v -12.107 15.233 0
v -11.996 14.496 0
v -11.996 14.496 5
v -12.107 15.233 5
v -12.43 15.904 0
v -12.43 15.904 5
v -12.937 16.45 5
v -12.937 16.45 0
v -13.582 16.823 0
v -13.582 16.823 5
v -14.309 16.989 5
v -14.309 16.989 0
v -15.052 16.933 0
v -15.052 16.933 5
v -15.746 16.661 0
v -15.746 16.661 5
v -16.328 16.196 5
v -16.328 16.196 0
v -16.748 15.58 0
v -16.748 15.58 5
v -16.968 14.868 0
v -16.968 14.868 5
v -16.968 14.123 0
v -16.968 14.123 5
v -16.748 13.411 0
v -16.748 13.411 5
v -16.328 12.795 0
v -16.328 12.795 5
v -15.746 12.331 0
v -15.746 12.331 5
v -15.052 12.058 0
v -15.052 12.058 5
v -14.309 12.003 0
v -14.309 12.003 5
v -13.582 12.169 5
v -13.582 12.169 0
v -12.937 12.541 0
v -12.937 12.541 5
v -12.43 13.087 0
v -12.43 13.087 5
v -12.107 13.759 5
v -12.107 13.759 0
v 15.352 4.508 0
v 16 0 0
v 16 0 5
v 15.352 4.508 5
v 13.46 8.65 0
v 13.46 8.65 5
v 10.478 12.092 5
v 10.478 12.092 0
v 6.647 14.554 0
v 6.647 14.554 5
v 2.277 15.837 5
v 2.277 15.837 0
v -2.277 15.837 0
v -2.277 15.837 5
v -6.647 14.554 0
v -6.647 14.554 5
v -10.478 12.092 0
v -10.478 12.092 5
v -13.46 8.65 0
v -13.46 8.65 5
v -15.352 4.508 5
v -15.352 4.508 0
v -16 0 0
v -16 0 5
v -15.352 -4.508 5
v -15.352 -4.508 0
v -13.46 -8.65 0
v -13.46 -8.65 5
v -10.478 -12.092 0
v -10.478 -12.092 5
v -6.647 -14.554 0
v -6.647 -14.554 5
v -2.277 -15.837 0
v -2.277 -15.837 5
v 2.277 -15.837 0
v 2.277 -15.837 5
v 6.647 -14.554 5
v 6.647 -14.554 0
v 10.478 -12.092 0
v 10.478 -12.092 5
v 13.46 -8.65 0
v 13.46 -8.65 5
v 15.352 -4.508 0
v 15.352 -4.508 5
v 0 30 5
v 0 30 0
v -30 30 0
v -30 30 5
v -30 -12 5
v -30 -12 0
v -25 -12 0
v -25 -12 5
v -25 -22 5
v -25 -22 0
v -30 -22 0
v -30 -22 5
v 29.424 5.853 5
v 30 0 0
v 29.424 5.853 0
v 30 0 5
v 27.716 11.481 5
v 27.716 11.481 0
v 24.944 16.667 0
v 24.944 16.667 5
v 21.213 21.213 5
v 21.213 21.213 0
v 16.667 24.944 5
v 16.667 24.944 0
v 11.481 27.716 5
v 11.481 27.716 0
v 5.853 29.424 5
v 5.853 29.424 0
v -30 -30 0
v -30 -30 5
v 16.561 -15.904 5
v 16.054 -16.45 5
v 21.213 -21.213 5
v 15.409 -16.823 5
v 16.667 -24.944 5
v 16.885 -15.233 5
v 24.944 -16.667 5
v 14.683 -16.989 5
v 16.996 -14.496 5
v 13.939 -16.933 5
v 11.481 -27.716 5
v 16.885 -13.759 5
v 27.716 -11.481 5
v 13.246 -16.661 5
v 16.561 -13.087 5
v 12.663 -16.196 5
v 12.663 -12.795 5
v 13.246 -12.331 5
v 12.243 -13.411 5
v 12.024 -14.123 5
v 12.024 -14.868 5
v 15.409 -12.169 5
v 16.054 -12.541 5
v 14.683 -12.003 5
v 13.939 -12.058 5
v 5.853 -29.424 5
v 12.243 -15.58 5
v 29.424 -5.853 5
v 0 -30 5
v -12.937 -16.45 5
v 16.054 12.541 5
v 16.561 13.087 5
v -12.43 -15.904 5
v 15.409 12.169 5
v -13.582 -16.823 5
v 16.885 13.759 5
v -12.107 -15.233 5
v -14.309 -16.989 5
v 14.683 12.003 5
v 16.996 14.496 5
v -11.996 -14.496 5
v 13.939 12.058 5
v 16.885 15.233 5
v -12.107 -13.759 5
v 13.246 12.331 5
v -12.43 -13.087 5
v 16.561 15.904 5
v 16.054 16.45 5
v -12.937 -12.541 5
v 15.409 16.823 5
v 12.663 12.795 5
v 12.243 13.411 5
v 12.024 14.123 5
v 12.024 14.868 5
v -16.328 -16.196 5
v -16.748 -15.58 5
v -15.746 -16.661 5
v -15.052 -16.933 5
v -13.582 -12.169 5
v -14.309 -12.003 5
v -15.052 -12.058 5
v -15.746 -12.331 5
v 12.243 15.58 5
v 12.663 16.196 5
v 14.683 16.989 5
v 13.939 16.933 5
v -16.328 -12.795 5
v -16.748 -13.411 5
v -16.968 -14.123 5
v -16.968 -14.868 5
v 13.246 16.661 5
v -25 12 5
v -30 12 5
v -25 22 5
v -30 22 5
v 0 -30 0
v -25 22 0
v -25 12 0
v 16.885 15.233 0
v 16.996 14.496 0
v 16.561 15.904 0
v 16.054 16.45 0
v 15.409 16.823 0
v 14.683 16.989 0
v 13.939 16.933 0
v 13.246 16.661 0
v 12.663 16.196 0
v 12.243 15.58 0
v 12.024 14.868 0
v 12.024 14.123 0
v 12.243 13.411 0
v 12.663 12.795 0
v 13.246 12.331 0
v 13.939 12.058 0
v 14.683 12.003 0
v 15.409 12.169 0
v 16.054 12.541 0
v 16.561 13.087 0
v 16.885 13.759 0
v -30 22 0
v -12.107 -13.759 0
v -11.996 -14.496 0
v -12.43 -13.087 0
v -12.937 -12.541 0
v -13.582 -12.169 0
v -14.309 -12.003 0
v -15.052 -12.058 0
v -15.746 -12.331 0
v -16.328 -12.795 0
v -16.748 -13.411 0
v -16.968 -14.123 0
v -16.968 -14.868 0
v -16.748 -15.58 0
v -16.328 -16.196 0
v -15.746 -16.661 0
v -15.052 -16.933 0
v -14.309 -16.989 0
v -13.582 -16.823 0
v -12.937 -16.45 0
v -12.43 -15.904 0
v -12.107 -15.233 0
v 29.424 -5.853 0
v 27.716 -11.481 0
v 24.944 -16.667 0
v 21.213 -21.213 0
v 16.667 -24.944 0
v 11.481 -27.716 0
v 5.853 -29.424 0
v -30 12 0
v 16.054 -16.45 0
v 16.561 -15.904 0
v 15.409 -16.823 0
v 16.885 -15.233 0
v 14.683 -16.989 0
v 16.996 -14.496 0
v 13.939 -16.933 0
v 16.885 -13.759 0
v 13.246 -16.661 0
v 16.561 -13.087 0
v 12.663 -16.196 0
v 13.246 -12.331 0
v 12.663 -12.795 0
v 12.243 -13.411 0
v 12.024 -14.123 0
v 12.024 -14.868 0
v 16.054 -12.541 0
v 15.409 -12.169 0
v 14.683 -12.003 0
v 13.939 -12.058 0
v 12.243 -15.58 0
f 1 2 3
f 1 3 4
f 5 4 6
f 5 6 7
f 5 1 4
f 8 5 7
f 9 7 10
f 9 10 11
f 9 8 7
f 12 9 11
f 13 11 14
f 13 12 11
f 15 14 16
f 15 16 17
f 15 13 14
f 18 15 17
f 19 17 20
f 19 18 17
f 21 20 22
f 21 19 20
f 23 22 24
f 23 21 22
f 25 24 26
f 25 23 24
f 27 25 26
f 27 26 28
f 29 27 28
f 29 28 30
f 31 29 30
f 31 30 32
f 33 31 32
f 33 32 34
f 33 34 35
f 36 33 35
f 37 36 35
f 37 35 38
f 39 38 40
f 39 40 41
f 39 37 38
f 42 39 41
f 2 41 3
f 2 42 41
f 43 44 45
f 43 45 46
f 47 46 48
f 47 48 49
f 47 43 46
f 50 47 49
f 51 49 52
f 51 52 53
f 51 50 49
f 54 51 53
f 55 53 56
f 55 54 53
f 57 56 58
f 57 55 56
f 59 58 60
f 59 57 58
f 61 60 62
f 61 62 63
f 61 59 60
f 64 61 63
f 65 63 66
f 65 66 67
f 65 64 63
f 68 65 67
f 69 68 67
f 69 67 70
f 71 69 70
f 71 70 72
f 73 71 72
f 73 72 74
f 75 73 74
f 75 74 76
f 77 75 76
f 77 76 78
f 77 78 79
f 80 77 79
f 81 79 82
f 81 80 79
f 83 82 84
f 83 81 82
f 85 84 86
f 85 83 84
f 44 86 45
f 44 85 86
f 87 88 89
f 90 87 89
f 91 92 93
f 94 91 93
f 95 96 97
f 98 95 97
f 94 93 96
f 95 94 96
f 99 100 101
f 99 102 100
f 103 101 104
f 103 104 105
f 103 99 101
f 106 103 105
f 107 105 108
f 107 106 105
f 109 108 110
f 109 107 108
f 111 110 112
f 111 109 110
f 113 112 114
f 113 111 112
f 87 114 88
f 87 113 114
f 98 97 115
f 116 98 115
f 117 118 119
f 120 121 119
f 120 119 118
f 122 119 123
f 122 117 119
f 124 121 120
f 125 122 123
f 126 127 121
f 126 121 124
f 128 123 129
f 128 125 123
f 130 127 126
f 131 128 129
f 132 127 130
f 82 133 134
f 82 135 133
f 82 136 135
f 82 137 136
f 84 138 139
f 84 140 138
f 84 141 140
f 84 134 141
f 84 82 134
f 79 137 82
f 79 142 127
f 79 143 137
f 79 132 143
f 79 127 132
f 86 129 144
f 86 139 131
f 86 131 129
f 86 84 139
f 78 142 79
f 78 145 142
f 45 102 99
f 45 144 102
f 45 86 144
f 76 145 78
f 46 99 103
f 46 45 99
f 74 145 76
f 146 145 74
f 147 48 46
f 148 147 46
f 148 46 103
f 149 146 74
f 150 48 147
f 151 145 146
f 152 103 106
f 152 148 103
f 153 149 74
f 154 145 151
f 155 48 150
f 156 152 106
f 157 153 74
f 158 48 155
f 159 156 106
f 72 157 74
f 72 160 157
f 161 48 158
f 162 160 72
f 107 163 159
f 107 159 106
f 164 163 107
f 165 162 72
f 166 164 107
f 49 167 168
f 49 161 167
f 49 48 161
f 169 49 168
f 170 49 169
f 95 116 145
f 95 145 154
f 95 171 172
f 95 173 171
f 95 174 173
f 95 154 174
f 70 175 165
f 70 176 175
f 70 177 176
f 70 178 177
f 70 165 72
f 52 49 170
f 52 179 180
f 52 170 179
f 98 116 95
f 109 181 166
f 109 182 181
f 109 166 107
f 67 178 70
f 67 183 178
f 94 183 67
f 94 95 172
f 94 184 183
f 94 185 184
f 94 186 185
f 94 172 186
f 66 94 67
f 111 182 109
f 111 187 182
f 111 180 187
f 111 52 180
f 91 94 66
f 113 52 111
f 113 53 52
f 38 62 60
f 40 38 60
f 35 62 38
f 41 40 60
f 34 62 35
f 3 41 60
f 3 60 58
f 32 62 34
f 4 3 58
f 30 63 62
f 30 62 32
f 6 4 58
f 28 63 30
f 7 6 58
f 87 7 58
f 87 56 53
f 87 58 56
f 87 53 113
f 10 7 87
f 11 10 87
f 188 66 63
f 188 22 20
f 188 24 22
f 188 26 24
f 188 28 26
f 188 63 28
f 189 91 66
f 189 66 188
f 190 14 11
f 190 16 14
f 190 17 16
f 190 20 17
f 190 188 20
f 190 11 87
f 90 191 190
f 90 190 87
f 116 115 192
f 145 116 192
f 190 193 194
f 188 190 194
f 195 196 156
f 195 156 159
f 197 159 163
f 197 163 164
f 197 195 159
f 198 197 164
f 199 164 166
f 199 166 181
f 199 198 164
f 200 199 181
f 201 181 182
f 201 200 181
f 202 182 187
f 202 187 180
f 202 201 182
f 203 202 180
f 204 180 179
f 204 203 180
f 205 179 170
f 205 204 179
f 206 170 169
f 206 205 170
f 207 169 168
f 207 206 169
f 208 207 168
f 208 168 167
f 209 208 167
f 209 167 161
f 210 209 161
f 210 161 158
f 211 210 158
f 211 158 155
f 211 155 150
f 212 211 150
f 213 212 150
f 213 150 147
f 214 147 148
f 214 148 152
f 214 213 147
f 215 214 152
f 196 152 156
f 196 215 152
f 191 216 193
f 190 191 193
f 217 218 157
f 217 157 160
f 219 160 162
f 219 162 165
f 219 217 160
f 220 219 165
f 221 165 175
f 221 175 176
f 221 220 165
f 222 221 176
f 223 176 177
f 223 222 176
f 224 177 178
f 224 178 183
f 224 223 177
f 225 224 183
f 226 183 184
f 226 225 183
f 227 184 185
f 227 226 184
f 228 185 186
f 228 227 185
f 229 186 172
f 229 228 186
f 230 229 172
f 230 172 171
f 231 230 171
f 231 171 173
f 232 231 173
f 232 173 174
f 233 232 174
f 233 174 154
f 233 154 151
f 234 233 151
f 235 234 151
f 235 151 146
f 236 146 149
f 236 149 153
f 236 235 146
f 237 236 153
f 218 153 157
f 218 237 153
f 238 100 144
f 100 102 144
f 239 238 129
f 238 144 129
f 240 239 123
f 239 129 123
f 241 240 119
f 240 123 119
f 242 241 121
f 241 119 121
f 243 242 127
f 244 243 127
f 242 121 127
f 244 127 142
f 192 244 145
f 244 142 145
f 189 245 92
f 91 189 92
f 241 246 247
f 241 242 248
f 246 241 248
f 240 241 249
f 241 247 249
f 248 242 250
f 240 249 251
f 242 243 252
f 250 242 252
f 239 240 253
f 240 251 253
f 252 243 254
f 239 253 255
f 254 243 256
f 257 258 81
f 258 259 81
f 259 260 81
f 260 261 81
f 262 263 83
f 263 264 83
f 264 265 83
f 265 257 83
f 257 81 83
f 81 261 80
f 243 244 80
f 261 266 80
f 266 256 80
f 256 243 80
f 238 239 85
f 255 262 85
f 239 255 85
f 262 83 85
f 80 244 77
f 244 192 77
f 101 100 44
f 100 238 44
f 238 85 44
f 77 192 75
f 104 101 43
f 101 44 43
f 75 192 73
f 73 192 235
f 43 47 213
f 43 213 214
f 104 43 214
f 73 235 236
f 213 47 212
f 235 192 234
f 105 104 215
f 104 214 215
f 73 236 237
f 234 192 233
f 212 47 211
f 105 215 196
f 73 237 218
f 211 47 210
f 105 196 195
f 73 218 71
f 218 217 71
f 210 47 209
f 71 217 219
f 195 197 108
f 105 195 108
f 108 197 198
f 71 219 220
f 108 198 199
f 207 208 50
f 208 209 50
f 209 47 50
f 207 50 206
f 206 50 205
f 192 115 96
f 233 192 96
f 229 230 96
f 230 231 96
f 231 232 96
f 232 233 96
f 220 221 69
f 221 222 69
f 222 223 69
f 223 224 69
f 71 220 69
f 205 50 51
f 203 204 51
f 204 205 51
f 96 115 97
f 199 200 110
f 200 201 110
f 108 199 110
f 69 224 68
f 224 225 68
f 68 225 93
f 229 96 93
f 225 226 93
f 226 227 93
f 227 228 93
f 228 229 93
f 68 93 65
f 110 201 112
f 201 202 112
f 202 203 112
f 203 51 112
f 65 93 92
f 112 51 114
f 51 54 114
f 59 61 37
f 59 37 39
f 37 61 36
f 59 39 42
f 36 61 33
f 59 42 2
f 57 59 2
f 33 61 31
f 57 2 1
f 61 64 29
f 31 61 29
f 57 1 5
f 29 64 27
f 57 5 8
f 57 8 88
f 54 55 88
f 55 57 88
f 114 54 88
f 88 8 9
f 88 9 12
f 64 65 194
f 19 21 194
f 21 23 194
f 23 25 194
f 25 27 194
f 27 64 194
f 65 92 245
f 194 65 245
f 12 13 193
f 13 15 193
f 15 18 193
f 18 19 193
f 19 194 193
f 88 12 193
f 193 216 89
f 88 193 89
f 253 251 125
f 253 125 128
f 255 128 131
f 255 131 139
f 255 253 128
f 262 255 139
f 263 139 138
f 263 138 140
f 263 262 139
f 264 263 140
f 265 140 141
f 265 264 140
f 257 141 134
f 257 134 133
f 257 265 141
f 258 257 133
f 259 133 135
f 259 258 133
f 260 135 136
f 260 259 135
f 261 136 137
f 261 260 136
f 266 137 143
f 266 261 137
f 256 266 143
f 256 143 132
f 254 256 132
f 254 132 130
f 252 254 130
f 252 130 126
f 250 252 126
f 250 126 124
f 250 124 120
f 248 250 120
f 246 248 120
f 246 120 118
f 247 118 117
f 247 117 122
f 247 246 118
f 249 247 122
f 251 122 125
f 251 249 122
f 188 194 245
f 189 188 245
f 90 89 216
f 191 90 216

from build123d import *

# Parameters (mm, degrees)
SKETCH1_R           = 16
SKETCH1_R_2         = 2.5
BOSS_EXTRUDE1_DEPTH = 5
FILLET1_R           = 30


with BuildPart() as part:
    # Sketch1 → Boss-Extrude1 (new body)
    with BuildSketch(Plane(origin=(0, 0, 0), x_dir=(0, 1, 0), z_dir=(0, 0, 1))):
        Polygon((-30, -30), (30, -30), (30, 30), (22, 30), (22, 25), (12, 25), (12, 30), (-12, 30), (-12, 25), (-22, 25), (-22, 30), (-30, 30), align=None)
        with Locations(Location((0, 0, 0), (0, 0, 270))):
            Circle(SKETCH1_R, mode=Mode.SUBTRACT)
        with Locations(Location((14.495689014, 14.495689014, 0), (0, 0, 270))):
            Circle(SKETCH1_R_2, mode=Mode.SUBTRACT)
        with Locations(Location((14.495689014, -14.495689014, 0), (0, 0, 270))):
            Circle(SKETCH1_R_2, mode=Mode.SUBTRACT)
        with Locations(Location((-14.495689014, -14.495689014, 0), (0, 0, 270))):
            Circle(SKETCH1_R_2, mode=Mode.SUBTRACT)
        with Locations(Location((-14.495689014, 14.495689014, 0), (0, 0, 270))):
            Circle(SKETCH1_R_2, mode=Mode.SUBTRACT)
    extrude(amount=BOSS_EXTRUDE1_DEPTH)

    # Fillet1
    fillet1_edges = [part.edges().sort_by_distance(p)[0] for p in [
        (30, 30, 2.5),
        (30, -30, 2.5),
    ]]
    fillet(fillet1_edges, radius=FILLET1_R - 0.0001)  # a hair under: the kernel refuses the full size


solid = part.part
